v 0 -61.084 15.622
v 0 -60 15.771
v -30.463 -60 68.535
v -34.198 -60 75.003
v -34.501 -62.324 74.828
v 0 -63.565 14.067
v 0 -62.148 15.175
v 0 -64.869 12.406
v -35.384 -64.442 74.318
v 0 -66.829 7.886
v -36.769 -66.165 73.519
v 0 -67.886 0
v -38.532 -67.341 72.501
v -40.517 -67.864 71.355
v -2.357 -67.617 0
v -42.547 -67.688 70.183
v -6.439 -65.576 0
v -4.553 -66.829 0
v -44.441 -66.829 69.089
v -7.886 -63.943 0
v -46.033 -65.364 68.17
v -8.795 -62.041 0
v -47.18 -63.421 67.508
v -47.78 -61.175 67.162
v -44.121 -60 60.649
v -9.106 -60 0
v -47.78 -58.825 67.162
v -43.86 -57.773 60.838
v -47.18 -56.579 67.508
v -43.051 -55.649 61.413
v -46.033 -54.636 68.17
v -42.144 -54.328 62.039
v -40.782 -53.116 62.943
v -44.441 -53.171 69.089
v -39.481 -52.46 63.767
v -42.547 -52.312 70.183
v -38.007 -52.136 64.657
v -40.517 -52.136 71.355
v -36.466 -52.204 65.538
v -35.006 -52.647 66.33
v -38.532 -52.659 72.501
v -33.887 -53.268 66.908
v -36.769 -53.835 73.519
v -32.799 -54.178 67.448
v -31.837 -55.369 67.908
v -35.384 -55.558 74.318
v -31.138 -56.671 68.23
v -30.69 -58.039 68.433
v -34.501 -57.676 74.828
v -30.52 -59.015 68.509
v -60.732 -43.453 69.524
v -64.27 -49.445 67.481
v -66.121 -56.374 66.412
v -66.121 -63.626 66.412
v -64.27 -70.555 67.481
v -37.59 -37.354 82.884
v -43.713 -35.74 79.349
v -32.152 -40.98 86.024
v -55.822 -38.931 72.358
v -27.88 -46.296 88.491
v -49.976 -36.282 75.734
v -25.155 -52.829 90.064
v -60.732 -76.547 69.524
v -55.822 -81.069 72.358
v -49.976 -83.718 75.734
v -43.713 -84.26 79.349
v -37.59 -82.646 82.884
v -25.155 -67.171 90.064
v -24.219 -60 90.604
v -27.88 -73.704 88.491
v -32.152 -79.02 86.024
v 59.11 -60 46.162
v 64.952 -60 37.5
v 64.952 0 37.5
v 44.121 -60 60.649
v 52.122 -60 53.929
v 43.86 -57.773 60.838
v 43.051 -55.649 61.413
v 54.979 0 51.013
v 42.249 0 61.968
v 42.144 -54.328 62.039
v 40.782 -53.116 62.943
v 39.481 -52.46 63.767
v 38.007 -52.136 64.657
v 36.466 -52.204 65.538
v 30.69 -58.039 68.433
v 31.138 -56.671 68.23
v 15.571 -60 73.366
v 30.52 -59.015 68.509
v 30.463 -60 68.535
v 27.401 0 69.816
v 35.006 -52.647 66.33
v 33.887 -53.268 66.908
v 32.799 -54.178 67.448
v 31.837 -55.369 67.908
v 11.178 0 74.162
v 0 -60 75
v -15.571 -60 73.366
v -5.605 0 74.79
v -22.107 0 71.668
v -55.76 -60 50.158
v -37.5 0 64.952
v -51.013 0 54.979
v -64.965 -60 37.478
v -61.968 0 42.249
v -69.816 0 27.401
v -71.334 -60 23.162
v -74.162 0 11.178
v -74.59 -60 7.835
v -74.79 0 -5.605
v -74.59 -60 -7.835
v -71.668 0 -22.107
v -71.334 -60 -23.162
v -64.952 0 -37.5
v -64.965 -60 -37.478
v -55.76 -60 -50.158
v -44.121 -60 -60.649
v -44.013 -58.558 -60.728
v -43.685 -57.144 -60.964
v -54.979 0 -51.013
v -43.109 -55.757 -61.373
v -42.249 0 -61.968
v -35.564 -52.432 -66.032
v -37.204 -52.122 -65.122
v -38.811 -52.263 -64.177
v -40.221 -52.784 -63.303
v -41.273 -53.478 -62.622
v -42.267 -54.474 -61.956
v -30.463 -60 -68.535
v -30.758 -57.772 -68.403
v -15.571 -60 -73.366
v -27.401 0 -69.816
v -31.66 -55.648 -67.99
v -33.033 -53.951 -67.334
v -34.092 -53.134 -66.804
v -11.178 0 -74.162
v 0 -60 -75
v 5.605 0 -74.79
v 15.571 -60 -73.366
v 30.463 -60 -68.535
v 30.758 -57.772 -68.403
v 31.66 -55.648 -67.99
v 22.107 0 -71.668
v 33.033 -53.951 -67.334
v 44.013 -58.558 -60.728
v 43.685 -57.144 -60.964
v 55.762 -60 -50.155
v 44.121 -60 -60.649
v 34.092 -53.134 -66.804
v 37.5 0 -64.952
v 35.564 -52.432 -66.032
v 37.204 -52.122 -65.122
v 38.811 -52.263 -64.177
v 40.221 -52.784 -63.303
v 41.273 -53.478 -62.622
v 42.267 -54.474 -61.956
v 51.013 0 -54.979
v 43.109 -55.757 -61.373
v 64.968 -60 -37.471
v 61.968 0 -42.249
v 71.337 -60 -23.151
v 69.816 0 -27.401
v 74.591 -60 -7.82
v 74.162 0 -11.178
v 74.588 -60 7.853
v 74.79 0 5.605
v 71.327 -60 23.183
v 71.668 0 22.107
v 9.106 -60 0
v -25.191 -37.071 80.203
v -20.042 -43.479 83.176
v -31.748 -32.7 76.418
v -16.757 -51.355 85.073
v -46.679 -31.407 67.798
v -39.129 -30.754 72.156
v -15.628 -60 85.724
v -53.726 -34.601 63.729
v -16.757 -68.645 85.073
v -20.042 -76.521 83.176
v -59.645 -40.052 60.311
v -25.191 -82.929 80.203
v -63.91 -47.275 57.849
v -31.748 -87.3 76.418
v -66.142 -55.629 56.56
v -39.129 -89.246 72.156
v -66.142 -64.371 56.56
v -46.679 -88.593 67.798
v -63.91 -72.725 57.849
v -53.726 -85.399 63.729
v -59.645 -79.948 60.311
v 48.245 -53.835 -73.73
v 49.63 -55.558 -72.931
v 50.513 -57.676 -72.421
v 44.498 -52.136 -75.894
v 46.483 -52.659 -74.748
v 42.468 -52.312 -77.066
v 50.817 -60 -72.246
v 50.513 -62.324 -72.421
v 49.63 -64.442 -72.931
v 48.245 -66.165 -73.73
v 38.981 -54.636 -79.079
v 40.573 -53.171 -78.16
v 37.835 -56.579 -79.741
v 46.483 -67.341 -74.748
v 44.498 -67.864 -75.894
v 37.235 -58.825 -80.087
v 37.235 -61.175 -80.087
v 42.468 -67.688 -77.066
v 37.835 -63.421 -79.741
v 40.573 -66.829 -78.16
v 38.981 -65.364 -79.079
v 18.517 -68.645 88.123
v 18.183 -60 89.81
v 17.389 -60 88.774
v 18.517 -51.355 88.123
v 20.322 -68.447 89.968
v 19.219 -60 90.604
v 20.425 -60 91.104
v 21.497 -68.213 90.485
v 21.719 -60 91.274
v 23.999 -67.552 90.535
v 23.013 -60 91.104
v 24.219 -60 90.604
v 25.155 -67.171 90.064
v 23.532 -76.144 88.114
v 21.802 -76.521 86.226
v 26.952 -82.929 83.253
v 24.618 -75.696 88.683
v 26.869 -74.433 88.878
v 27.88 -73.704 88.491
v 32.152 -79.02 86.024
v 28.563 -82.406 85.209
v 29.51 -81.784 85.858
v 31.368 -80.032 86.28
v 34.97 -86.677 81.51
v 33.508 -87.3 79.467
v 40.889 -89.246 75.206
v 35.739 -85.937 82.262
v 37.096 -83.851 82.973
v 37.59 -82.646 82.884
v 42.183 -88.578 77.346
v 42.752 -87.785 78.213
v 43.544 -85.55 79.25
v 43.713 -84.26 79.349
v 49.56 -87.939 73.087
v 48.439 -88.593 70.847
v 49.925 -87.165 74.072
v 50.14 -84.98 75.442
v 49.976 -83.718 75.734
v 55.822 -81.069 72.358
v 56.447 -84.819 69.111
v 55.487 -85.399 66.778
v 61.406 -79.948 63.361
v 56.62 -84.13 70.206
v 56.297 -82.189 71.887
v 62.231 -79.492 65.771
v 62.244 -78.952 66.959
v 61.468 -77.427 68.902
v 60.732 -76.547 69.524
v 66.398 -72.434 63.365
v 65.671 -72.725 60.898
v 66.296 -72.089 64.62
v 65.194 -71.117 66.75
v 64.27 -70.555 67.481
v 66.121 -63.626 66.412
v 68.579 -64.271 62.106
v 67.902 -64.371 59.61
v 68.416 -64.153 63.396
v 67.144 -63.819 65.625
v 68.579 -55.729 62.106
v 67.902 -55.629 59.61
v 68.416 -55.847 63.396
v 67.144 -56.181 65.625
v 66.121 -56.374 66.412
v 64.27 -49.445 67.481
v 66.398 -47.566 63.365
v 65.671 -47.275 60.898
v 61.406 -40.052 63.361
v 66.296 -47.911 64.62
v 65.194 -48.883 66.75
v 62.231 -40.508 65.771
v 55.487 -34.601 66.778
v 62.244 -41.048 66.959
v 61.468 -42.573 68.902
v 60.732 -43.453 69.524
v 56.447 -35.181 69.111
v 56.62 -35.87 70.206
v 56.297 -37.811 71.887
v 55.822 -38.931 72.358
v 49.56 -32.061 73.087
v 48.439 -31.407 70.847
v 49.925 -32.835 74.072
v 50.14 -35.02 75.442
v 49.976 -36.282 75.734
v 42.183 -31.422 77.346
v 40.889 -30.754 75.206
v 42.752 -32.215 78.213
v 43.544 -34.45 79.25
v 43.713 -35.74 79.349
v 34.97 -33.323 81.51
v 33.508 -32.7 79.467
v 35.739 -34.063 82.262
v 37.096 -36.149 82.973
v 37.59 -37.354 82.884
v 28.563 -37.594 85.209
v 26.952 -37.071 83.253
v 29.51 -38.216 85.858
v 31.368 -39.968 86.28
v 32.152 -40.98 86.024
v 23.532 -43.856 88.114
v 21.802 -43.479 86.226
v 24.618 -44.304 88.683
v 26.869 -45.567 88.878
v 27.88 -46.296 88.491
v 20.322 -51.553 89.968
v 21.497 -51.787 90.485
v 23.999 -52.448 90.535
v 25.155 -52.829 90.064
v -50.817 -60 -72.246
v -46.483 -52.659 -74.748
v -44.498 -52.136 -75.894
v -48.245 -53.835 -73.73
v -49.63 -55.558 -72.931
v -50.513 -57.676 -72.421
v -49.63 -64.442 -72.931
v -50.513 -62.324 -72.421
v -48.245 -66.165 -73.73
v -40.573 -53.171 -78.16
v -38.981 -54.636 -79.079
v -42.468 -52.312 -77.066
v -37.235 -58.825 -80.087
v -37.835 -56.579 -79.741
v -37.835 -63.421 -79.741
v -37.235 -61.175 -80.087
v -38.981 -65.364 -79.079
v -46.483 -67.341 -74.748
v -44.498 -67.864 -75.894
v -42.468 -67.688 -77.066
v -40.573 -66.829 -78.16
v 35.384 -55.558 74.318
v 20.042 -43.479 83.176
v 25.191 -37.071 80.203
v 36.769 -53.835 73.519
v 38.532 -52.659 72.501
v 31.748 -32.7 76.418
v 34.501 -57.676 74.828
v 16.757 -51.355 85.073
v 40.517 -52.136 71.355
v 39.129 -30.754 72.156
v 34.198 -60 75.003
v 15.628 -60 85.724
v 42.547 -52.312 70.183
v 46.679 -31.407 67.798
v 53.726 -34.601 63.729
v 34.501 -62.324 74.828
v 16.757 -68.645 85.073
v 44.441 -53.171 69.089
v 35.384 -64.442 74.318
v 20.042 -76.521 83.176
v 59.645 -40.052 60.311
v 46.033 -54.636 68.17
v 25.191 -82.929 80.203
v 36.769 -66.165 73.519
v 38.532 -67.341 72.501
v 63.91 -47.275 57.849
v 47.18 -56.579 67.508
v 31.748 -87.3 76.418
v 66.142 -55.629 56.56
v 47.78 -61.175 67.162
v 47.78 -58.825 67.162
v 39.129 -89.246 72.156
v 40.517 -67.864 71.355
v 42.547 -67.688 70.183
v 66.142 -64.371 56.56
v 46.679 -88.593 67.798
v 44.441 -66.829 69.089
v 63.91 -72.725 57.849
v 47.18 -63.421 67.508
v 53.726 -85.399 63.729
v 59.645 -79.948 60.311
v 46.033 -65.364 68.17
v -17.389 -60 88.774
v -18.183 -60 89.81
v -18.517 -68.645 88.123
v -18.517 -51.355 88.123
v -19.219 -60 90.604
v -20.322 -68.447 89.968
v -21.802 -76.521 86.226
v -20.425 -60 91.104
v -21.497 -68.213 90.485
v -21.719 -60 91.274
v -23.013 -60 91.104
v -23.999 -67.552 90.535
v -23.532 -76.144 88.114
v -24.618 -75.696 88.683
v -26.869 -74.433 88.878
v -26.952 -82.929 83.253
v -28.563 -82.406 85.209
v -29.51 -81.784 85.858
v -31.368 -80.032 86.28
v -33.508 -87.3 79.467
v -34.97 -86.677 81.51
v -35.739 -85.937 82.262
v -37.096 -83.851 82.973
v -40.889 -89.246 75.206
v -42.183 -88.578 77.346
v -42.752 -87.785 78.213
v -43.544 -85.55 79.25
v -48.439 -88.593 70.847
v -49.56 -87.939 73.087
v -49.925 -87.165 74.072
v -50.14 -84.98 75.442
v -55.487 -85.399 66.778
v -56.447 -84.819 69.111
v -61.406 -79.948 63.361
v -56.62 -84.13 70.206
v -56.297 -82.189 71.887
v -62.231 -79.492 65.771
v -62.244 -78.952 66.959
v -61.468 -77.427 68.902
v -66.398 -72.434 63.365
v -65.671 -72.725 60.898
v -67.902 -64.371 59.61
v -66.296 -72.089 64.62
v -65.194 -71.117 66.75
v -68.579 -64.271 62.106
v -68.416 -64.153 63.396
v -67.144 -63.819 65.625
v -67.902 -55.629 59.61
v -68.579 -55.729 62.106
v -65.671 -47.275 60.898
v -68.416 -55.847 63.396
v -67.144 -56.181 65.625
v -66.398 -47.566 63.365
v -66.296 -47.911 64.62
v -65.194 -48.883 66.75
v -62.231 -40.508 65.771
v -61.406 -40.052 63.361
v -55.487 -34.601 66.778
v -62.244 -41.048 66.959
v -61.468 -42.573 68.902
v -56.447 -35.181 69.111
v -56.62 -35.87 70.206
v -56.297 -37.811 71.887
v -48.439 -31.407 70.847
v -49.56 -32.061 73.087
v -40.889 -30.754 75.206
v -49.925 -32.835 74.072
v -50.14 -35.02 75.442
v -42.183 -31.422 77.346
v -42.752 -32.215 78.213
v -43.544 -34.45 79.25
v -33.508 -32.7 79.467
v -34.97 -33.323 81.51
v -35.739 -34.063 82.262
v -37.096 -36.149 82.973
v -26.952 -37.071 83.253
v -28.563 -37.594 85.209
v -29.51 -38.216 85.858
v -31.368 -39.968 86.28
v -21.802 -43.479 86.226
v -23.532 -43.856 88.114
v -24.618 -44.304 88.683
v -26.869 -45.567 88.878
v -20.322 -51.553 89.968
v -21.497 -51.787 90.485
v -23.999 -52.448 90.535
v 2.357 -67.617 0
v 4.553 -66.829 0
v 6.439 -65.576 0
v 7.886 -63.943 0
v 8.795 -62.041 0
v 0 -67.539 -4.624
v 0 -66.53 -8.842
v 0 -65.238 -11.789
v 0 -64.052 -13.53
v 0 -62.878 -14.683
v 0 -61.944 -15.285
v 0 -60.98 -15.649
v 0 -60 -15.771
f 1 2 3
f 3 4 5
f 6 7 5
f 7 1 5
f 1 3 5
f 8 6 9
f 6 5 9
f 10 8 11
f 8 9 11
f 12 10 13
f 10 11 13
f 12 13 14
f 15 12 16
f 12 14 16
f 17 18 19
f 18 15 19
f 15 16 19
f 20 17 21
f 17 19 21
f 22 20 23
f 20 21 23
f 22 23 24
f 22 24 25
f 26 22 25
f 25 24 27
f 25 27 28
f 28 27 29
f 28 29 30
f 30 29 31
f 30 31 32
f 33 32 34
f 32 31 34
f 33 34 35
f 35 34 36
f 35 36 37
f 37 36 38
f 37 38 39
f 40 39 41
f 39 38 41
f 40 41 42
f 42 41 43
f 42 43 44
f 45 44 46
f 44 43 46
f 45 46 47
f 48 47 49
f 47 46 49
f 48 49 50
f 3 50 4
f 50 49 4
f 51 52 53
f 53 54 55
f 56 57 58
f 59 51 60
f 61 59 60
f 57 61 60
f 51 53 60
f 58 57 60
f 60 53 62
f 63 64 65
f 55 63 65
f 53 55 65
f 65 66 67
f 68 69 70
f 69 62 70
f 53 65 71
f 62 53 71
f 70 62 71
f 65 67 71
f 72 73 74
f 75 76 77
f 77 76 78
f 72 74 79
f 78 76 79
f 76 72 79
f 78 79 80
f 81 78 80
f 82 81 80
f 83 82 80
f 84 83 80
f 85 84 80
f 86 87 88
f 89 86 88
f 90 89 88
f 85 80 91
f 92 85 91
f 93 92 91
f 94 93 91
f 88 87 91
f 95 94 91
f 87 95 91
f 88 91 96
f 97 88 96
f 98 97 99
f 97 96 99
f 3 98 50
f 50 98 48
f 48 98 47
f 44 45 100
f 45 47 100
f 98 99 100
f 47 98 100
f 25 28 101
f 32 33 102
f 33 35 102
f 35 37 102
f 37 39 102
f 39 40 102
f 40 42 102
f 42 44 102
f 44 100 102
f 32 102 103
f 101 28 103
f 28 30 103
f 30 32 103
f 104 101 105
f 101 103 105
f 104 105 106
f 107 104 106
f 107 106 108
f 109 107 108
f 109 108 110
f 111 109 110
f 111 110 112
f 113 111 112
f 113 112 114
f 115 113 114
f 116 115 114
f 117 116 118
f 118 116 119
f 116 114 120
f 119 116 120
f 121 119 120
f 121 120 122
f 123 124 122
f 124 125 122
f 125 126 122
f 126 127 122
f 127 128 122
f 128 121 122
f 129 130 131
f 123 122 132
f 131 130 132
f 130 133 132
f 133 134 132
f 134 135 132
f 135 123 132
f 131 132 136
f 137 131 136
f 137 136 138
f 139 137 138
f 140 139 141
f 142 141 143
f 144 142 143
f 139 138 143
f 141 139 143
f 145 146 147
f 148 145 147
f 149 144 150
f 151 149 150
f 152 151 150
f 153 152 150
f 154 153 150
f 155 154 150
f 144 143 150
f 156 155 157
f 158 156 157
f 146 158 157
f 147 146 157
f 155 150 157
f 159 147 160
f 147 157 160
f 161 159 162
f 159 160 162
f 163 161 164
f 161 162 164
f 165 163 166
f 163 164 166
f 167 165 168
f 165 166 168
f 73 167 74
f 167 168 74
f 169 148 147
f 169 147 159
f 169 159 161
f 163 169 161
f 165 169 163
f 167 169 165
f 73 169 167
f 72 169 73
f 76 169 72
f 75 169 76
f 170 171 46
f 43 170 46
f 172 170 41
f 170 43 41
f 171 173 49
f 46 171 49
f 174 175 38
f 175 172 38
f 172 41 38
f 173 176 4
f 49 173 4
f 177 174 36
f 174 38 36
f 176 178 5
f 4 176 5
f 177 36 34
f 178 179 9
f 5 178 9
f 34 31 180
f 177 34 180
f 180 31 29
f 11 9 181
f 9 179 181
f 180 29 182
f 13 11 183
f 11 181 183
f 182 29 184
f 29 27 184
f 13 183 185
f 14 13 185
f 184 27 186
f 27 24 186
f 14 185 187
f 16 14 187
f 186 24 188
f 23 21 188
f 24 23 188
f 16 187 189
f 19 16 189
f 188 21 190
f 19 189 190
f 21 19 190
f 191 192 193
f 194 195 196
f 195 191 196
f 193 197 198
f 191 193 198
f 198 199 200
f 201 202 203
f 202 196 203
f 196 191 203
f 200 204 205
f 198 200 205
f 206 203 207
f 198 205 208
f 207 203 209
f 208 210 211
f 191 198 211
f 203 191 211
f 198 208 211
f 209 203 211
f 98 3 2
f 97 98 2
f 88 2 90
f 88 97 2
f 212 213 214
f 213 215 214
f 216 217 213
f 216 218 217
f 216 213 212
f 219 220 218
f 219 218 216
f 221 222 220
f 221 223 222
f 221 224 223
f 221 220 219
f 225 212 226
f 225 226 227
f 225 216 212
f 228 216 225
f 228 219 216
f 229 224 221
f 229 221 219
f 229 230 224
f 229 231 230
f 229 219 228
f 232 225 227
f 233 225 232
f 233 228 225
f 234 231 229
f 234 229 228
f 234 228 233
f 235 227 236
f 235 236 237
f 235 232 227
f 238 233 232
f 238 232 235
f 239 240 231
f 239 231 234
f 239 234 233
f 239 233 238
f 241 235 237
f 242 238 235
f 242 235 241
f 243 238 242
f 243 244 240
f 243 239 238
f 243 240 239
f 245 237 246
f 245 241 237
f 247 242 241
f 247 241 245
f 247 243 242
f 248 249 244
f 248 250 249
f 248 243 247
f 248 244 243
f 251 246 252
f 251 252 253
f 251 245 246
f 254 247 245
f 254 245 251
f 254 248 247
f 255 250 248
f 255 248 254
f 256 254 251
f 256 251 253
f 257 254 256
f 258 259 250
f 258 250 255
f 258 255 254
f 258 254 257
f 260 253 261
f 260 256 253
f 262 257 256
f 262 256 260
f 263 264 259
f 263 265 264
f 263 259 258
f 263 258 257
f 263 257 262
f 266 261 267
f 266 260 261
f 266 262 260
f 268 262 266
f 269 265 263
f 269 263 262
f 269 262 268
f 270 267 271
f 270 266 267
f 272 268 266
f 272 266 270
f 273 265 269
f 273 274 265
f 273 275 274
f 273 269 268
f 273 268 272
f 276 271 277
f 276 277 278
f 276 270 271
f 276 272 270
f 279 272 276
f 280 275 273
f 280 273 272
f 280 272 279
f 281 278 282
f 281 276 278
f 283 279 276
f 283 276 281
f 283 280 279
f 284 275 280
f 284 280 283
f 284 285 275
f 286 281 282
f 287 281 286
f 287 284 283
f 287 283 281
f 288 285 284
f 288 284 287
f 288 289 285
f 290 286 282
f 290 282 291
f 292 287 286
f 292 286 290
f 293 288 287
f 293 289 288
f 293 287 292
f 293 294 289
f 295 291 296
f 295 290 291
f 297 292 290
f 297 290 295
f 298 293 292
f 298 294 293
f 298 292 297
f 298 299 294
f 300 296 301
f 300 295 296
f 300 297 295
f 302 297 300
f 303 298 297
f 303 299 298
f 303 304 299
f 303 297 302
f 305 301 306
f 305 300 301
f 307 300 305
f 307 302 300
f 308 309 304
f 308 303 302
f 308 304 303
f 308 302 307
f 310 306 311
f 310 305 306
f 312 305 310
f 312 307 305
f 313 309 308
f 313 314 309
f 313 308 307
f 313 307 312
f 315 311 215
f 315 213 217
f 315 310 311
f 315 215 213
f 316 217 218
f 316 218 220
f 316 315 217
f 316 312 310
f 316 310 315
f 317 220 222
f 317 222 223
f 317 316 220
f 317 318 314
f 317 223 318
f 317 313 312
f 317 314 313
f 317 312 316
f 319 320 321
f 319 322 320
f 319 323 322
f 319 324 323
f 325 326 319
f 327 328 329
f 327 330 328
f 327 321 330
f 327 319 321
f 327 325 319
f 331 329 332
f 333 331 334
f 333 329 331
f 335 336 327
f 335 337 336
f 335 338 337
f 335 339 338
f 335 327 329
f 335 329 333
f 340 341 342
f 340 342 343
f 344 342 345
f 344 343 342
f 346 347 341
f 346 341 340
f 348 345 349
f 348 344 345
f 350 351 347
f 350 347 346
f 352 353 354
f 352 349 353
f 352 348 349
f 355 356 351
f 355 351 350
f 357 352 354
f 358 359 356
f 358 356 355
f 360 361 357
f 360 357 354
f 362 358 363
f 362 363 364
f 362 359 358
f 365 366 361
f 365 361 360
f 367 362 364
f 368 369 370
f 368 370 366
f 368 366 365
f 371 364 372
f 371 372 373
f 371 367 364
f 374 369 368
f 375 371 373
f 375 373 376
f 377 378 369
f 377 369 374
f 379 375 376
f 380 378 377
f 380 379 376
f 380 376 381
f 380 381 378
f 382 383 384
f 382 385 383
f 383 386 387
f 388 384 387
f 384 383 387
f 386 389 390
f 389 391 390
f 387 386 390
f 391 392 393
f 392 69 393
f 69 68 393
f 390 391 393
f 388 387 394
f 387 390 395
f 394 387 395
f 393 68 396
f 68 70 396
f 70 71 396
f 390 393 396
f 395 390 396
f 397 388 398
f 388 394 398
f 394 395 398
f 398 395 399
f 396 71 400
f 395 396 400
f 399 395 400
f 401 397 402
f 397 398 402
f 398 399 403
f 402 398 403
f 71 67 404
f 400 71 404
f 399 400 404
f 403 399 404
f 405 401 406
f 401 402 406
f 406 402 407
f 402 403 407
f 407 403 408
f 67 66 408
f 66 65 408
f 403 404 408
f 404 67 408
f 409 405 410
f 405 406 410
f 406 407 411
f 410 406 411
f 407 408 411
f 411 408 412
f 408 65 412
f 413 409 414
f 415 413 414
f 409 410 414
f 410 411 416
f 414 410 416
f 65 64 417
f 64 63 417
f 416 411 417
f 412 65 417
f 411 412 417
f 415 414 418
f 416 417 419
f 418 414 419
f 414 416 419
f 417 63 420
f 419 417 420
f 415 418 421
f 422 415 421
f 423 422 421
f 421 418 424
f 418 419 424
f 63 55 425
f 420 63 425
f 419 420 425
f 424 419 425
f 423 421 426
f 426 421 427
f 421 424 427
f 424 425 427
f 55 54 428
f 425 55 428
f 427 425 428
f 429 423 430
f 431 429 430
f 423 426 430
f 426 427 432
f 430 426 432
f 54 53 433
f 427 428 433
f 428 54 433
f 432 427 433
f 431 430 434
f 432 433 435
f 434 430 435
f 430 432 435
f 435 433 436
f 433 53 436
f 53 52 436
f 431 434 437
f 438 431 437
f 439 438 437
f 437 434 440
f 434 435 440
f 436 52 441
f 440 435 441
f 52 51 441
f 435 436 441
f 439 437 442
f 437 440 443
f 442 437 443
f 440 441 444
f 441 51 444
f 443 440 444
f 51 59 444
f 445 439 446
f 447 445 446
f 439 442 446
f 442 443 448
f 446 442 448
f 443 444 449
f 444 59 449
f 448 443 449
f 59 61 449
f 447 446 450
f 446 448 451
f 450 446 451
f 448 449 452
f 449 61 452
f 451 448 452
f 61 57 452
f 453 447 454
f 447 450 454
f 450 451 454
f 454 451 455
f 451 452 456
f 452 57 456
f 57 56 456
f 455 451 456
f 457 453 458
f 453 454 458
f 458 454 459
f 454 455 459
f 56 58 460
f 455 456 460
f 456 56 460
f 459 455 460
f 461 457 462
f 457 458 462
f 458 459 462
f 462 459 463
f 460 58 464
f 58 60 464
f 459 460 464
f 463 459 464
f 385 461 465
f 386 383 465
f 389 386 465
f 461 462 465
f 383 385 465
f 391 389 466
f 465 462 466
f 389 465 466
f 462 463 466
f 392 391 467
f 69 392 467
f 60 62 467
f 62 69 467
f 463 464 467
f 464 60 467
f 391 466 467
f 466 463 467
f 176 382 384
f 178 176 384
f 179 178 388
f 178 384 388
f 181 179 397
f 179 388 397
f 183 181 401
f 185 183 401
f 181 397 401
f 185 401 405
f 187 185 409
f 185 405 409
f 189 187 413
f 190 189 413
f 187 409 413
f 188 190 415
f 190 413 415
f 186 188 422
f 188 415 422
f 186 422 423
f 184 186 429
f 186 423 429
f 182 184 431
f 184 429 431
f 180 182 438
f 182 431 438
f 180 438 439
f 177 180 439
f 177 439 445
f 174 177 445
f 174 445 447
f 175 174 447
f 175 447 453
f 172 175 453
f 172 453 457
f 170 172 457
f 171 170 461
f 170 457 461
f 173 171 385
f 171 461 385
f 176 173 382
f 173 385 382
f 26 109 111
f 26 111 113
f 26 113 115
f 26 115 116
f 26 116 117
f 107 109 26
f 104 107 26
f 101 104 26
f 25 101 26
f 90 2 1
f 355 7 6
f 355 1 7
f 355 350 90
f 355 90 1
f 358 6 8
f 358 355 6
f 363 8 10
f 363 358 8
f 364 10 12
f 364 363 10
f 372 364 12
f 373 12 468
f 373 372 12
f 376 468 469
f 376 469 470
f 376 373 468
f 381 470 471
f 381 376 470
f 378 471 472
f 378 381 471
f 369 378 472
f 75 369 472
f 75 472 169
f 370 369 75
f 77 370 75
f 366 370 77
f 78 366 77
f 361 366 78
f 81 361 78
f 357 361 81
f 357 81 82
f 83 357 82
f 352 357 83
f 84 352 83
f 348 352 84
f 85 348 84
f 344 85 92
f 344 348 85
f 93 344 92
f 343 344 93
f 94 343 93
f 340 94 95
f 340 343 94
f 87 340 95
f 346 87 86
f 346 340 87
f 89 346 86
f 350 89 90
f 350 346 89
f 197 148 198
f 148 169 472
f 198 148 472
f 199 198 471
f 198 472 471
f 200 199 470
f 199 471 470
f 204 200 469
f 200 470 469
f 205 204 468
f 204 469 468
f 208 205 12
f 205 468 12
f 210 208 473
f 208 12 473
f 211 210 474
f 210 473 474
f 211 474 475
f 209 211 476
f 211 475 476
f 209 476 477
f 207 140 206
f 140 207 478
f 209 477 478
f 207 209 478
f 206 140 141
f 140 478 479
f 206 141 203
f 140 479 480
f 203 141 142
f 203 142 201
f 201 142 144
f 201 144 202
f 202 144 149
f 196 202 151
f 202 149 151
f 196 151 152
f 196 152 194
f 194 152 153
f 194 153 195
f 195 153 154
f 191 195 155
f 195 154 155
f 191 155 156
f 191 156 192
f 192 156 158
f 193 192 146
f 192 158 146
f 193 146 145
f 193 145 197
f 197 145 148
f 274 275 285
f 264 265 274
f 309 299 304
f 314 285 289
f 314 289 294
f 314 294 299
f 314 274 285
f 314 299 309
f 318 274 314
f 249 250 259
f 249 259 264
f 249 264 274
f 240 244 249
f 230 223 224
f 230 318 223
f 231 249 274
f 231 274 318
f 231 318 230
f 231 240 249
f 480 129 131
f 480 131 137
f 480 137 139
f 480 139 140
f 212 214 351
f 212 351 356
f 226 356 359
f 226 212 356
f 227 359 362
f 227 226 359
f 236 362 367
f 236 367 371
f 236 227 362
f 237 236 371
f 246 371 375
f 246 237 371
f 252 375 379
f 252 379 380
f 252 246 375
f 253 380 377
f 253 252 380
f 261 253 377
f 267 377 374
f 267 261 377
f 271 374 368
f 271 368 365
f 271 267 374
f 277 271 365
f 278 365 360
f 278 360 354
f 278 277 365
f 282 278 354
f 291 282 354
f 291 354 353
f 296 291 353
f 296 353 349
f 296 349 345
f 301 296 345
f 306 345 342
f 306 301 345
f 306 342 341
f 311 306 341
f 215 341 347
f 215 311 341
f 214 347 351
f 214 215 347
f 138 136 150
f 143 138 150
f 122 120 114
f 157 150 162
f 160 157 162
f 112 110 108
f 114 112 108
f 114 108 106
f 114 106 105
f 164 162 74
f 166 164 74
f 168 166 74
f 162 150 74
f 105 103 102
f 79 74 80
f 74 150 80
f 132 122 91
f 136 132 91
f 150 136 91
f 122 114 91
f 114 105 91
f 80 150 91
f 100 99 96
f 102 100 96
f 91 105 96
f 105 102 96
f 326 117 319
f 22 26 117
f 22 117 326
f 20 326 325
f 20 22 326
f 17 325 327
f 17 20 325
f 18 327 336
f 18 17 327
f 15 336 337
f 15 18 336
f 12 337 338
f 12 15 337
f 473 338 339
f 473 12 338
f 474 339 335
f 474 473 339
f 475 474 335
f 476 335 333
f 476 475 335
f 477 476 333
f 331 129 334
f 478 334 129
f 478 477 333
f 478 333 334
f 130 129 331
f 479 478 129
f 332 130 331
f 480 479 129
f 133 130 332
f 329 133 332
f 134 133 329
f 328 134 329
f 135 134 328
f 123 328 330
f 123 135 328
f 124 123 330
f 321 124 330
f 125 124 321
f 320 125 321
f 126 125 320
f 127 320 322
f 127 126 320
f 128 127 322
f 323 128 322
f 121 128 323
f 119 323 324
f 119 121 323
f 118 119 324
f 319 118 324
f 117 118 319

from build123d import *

# Parameters (mm, degrees)
F0_R     = 75
F1_DEPTH = 60
F3_W     = 7.8857280314
F3_H     = 170.0287312269
F5_ANGLE = 30
F7_R     = 5
F8_R     = 5


with BuildPart() as f1:
    # F0 (on Front) → F1 (new body)
    with BuildSketch(Plane.XZ):
        Circle(F0_R)
    extrude(amount=F1_DEPTH)

    # F3 (on face) → F4 (revolve)
    with BuildSketch(Plane.XZ.offset(60)):
        Polygon((0, 90.5750542879), (0, 82.0537060499), (7.8857280314, 82.0537060499), (29.3278116733, 82.0537060499), (29.3278116733, 90.5750542879), align=None)
        with Locations((3.9428640157, -2.9606595635)):
            Rectangle(F3_W, F3_H)
    revolve(axis=Axis((0, -60, -2.9606595635), (0, 0, -1)))


with BuildPart() as f1_1:
    # F5: moved
    add(f1.part.rotate(Axis((0, 0, 0), (0, -1, 0)), F5_ANGLE))

    # F6: F1 across plane


with BuildPart() as f1_2:
    add(f1_1.part)
    add(f1_1.part.mirror(Plane.YZ))

    # F7
    f7_edges = [f1_2.edges().sort_by_distance(p)[0] for p in [
        (-70.686157, -60, 63.776392),
    ]]
    fillet(f7_edges, radius=F7_R)

    # F8
    f8_edges = [f1_2.edges().sort_by_distance(p)[0] for p in [
        (70.686157, -60, 63.776392),
    ]]
    fillet(f8_edges, radius=F8_R)


solid = f1_2.part
